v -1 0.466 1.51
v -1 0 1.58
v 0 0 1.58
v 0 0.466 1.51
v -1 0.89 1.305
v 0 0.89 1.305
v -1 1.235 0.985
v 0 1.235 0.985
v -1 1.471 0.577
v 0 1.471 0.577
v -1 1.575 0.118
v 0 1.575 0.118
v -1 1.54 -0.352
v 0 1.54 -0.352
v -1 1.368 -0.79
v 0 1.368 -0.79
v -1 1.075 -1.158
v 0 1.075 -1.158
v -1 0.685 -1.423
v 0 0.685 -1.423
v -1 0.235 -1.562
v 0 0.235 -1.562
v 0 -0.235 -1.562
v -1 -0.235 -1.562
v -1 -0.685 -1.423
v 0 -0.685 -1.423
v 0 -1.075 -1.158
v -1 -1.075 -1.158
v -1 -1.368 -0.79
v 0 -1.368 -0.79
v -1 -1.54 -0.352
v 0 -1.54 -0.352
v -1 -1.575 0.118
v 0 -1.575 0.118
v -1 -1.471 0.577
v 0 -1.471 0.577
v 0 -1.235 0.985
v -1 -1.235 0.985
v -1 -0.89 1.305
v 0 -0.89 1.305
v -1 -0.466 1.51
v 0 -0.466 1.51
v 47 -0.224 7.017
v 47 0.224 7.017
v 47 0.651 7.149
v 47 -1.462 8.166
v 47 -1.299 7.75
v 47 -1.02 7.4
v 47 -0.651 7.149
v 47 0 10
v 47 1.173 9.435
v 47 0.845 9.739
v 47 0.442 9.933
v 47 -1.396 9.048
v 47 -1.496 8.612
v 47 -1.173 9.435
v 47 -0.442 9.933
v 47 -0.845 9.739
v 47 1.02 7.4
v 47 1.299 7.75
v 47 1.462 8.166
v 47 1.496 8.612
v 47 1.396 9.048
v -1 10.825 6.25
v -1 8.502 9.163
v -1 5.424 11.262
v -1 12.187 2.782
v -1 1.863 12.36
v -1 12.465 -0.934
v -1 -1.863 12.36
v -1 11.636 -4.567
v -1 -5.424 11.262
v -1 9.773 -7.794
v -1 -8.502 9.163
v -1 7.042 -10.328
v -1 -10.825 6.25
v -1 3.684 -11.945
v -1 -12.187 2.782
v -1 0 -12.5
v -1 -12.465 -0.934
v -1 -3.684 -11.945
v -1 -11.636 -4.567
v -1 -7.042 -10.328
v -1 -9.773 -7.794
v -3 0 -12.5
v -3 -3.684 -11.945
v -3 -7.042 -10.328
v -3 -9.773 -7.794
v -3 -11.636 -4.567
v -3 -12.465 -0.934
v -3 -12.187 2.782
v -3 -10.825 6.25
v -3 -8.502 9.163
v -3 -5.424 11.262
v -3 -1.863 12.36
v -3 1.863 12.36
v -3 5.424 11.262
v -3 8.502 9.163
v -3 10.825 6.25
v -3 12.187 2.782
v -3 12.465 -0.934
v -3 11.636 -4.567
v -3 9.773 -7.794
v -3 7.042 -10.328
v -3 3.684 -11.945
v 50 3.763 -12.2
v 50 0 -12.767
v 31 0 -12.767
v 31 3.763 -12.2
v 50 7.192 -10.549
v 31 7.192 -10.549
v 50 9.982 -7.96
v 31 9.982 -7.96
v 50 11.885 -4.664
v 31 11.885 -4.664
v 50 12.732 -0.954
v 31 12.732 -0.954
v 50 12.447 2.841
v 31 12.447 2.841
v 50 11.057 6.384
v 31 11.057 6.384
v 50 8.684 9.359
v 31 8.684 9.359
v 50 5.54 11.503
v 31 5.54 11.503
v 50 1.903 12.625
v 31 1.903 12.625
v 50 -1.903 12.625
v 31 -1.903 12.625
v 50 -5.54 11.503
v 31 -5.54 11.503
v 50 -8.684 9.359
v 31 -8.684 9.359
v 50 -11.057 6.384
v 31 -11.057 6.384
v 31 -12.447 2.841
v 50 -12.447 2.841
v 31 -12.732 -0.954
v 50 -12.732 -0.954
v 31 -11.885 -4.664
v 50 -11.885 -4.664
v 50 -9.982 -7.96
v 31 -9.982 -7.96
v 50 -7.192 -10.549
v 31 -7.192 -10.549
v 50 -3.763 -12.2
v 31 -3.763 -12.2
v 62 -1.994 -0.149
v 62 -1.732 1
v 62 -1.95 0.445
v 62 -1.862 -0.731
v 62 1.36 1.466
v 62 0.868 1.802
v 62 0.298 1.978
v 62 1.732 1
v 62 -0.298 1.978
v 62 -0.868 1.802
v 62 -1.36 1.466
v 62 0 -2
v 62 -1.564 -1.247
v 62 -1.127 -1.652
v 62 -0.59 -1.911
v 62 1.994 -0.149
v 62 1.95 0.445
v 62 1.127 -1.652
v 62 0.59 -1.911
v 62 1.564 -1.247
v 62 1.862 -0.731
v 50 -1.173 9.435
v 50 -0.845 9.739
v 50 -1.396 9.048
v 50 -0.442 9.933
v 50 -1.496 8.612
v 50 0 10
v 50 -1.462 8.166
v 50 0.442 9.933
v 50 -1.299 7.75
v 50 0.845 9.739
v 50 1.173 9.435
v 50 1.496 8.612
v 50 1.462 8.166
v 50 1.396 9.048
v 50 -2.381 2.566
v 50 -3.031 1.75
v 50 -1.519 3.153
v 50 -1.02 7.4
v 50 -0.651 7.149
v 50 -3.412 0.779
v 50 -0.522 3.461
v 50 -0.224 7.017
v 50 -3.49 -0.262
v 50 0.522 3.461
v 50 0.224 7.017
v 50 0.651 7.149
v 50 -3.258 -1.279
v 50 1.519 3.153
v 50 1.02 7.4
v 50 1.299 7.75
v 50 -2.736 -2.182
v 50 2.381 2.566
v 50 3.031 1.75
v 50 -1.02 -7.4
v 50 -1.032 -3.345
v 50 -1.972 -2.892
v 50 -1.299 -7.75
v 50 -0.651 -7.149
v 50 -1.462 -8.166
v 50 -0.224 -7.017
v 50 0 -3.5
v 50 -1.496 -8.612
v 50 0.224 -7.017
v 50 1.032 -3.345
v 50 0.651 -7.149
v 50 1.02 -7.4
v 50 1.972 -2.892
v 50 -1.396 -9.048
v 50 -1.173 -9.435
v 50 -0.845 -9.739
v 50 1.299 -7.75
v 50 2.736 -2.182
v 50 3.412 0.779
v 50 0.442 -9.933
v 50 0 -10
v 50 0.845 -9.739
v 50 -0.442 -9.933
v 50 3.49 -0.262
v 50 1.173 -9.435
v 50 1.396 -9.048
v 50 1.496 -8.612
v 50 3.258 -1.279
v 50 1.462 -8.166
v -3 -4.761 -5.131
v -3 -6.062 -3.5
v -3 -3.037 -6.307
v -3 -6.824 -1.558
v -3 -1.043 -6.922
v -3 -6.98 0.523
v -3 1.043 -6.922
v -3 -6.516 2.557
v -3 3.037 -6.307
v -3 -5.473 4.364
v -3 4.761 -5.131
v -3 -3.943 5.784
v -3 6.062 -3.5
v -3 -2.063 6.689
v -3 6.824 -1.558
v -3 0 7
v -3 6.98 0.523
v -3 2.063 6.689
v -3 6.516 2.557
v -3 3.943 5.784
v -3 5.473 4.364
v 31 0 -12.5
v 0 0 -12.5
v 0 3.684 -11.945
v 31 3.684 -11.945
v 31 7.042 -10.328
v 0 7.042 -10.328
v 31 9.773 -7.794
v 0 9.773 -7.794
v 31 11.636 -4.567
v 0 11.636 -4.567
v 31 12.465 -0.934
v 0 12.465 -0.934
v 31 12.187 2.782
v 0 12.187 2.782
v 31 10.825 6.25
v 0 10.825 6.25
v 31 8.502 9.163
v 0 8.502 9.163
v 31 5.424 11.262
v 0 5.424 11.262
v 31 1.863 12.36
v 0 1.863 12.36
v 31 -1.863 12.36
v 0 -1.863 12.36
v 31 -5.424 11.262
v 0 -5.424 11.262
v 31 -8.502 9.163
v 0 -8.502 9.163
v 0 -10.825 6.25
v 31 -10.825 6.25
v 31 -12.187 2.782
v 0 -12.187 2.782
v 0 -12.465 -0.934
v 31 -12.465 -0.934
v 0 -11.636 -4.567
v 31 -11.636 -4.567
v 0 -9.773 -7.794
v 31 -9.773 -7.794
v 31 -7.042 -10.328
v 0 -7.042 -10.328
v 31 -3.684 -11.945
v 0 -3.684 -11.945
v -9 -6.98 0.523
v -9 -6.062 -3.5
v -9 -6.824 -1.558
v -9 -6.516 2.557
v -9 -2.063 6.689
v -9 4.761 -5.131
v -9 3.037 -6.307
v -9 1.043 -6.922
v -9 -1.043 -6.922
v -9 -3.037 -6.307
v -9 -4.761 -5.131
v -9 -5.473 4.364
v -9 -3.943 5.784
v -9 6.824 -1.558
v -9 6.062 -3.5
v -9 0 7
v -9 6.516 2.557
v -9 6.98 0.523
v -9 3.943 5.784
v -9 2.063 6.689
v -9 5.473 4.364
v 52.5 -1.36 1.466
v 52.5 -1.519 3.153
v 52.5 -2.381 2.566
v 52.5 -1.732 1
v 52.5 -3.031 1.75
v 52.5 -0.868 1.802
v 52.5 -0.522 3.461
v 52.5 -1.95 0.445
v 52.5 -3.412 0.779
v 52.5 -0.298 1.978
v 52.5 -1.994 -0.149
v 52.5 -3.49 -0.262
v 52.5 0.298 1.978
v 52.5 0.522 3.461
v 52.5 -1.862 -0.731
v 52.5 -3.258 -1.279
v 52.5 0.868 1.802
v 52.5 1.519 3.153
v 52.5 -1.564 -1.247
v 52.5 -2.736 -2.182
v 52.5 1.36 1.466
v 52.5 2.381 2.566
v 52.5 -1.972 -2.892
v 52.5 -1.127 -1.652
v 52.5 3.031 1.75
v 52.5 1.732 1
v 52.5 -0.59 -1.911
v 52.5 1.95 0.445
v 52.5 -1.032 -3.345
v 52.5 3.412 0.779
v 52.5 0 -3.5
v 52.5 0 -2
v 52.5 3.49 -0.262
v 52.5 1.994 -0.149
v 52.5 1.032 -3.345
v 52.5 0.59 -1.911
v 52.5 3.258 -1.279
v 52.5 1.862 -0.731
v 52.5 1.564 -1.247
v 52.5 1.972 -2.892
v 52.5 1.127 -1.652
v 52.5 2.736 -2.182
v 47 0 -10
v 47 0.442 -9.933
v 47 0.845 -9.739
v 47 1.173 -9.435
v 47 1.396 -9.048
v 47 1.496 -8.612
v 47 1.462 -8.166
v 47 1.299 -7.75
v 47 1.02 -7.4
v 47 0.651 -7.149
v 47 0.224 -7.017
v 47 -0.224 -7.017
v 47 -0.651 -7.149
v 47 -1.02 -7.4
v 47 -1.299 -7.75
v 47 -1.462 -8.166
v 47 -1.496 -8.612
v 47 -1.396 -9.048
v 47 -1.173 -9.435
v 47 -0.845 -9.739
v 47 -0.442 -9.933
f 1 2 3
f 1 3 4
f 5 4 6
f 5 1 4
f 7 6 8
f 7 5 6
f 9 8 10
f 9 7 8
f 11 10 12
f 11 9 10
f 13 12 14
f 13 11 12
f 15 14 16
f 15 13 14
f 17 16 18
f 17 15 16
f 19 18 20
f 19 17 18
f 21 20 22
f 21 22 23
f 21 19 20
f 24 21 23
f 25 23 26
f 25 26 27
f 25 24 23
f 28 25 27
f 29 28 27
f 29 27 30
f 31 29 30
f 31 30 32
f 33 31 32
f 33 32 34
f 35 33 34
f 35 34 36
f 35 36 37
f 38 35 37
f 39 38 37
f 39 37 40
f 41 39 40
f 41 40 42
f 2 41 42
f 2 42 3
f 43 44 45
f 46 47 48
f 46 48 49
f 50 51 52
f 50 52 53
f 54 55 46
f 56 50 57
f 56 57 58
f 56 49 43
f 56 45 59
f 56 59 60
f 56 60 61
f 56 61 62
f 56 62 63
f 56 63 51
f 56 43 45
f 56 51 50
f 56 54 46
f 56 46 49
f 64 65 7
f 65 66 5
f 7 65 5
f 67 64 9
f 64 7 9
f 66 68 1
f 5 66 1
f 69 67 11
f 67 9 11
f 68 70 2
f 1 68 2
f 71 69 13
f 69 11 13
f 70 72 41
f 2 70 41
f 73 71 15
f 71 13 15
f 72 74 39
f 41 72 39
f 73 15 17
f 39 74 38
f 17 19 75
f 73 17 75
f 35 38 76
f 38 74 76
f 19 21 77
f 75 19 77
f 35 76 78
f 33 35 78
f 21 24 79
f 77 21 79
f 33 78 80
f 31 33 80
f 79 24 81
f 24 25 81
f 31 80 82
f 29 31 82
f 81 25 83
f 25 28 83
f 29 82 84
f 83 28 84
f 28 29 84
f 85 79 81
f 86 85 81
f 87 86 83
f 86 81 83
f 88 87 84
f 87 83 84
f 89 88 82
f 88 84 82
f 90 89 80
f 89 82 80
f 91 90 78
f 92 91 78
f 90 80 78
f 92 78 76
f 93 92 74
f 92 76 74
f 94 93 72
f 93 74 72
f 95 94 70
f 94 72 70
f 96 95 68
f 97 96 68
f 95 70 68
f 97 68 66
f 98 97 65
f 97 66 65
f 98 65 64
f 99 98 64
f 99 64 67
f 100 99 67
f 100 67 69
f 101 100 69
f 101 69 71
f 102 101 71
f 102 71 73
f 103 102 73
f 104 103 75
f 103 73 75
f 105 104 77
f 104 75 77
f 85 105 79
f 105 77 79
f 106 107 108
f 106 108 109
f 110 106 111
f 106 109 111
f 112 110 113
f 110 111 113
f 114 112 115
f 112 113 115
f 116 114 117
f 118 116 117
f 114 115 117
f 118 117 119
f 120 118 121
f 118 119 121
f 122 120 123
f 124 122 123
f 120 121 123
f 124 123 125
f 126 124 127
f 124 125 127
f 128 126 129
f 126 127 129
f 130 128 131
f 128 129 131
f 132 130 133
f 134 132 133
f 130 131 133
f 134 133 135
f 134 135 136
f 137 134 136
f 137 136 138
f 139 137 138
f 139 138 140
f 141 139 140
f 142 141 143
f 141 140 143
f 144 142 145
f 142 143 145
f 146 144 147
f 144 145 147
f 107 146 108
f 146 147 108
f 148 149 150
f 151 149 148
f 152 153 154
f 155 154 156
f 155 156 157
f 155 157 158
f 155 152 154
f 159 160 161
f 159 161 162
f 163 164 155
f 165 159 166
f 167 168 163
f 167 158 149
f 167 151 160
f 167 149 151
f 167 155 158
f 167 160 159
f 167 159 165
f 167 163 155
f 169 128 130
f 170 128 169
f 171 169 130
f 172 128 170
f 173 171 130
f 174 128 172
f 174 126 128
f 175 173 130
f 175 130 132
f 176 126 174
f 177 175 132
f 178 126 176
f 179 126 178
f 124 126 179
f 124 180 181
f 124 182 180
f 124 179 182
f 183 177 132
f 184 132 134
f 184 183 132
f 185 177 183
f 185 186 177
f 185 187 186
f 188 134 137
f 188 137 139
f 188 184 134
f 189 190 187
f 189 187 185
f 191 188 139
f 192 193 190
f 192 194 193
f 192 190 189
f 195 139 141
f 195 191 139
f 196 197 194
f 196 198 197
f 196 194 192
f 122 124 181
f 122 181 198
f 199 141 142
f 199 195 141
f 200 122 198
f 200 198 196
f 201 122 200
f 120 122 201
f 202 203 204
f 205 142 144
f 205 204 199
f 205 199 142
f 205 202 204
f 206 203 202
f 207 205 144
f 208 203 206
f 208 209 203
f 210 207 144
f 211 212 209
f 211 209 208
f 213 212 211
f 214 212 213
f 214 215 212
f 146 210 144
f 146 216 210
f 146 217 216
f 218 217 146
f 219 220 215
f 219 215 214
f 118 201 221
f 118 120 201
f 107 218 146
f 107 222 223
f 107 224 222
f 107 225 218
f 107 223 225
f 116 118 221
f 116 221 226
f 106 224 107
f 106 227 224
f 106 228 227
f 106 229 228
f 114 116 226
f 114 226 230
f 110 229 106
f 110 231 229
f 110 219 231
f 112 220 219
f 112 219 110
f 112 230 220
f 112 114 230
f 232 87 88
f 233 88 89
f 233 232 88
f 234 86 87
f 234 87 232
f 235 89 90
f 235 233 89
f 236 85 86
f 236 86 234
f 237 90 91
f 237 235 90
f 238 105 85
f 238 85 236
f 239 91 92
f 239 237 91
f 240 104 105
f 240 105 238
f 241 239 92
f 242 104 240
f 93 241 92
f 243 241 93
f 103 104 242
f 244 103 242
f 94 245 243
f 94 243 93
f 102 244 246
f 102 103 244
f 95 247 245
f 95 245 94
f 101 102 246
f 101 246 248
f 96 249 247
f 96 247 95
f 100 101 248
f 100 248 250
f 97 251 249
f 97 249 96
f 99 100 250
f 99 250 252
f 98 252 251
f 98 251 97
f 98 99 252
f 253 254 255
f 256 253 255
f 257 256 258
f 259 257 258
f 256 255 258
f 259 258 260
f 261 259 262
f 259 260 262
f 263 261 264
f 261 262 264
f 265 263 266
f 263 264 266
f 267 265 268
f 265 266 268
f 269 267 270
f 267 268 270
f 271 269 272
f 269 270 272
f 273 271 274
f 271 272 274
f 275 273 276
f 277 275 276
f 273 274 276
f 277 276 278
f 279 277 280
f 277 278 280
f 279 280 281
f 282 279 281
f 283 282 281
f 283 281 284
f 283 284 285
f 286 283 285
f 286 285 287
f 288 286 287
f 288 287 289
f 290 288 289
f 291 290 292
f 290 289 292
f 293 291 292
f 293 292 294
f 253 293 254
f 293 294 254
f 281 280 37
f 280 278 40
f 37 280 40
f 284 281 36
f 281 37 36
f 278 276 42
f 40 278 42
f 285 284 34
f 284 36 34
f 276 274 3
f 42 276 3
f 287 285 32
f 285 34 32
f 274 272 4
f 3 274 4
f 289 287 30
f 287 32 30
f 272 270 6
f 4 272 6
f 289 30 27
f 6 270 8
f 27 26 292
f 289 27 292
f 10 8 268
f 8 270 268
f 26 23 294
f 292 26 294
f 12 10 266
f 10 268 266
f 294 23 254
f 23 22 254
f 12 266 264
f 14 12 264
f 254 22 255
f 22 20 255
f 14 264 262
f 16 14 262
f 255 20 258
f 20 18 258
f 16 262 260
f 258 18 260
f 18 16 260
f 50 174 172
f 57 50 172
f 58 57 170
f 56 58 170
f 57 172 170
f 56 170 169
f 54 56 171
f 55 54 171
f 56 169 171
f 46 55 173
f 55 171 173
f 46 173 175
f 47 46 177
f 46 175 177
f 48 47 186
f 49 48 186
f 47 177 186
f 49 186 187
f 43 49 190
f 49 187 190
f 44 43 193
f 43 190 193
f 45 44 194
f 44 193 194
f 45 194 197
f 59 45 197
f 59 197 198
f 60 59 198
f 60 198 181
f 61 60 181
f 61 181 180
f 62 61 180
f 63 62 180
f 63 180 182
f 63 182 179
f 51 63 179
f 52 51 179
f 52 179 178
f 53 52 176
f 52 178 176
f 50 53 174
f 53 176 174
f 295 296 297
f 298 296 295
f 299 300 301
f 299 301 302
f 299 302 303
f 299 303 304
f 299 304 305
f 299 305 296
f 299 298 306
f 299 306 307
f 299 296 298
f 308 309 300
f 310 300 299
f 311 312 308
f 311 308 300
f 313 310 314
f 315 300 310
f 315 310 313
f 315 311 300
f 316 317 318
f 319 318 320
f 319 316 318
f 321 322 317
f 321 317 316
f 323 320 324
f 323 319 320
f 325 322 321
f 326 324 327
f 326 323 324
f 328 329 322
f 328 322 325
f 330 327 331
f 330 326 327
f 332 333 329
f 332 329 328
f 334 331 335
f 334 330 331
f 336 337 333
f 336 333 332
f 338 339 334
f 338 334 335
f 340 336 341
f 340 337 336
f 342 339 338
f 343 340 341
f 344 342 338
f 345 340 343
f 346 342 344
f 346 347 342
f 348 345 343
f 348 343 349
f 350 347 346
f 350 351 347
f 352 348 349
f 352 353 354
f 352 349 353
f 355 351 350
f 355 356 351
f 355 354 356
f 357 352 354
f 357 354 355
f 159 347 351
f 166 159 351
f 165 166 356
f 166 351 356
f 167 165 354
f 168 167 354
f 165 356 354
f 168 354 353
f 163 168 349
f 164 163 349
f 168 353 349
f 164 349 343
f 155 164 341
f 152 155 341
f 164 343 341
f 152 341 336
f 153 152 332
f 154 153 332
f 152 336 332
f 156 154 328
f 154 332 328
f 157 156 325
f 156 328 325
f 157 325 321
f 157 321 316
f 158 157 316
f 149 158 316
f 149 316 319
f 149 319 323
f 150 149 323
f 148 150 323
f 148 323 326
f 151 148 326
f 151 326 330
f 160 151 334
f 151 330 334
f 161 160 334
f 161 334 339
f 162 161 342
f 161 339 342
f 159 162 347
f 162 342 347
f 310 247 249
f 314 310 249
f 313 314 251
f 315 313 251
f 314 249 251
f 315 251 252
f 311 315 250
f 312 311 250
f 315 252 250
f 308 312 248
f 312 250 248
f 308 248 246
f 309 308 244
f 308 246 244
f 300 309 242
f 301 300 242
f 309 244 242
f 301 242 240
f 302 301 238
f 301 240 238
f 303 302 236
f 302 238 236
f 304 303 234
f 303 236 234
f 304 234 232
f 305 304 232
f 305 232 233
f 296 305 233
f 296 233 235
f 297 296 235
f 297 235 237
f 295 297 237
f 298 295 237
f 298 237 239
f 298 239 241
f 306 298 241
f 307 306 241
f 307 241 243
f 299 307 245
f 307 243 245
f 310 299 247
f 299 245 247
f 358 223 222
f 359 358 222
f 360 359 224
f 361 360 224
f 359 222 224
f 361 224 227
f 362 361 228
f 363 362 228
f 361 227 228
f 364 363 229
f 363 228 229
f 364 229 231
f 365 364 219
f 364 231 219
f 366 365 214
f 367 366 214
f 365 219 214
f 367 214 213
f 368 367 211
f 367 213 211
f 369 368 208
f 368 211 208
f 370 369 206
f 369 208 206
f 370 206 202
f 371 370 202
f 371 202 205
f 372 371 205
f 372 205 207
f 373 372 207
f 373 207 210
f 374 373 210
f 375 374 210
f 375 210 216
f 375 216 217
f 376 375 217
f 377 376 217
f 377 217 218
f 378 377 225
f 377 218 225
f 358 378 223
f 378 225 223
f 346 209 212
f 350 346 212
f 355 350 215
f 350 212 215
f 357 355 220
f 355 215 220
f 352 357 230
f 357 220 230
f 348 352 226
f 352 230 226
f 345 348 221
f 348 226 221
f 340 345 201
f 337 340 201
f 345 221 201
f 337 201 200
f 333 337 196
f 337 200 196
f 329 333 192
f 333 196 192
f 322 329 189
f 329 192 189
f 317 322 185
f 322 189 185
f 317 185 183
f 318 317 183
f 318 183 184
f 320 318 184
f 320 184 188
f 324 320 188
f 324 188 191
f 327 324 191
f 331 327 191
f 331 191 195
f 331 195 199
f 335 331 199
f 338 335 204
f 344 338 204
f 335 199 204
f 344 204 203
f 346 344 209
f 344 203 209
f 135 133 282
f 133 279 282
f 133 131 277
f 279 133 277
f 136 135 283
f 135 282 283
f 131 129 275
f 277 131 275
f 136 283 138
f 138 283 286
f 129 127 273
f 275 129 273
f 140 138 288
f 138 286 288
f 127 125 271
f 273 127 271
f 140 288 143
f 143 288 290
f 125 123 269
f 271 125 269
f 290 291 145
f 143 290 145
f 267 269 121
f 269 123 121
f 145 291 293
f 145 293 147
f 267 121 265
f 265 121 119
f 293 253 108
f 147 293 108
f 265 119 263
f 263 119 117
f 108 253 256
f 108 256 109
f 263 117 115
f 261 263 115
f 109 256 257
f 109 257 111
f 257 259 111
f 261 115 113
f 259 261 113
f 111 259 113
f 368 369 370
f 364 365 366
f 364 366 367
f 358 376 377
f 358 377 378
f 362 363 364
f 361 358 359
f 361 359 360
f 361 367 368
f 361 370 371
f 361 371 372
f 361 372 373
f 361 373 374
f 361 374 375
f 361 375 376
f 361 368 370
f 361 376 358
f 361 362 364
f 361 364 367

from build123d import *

# Parameters (mm, degrees)
SKETCH_1_R          = 12.5
EXTRUDE_1_DEPTH     = 31
SKETCH_2_R          = 12.76725859
EXTRUDE_2_DEPTH     = 19
SKETCH_3_R          = 3.5
EXTRUDE_3_DEPTH     = 2.5
SKETCH_4_R          = 2
EXTRUDE_4_DEPTH     = 9.5
EXTRUDE_START       = 1
SKETCH_5_R          = 12.5
EXTRUDE_5_DEPTH     = 2
SKETCH_6_R          = 1.579870025
EXTRUDE_6_DEPTH     = 4
SKETCH_7_R          = 7
EXTRUDE_7_DEPTH     = 6
SKETCH_8_R          = 1.5
CUT_EXTRUDE_1_DEPTH = 3


with BuildPart() as part:
    # 草图1 → 凸台-拉伸1 (new body)
    with BuildSketch(Plane(origin=(0, 0, 0), x_dir=(0, 0, -1), z_dir=(1, 0, 0))):
        Circle(SKETCH_1_R)
    extrude(amount=EXTRUDE_1_DEPTH)

    # 草图2 → 凸台-拉伸2 (add)
    with BuildSketch(Plane(origin=(31, 0, 0), x_dir=(0, 0, -1), z_dir=(1, 0, 0))):
        Circle(SKETCH_2_R)
    extrude(amount=EXTRUDE_2_DEPTH)

    # 草图3 → 凸台-拉伸3 (add)
    with BuildSketch(Plane(origin=(50, 0, 0), x_dir=(0, 0, -1), z_dir=(1, 0, 0))):
        Circle(SKETCH_3_R)
    extrude(amount=EXTRUDE_3_DEPTH)

    # 草图4 → 凸台-拉伸4 (add)
    with BuildSketch(Plane(origin=(52.5, 0, 0), x_dir=(0, 0, -1), z_dir=(1, 0, 0))):
        Circle(SKETCH_4_R)
    extrude(amount=EXTRUDE_4_DEPTH)



with BuildPart() as body_2:
    # 草图5 → 凸台-拉伸5 (new body)
    with BuildSketch(Plane.ZY.offset(EXTRUDE_START)):
        with Locations(Location((0, 0, 0), (0, 0, 180))):
            Circle(SKETCH_5_R)
    extrude(amount=EXTRUDE_5_DEPTH)


with BuildPart() as part_1:
    add(part.part)

    add(body_2.part)  # 凸台-拉伸6 merges body 2
    # 草图6 → 凸台-拉伸6 (add)
    with BuildSketch(Plane.ZY.offset(3)):
        Circle(SKETCH_6_R)
    extrude(amount=-EXTRUDE_6_DEPTH)

    # 草图7 → 凸台-拉伸7 (add)
    with BuildSketch(Plane.ZY.offset(3)):
        Circle(SKETCH_7_R)
    extrude(amount=EXTRUDE_7_DEPTH)

    # 草图8 → 切除-拉伸1 (cut)
    with BuildSketch(Plane(origin=(50, 0, 0), x_dir=(0, 0, -1), z_dir=(1, 0, 0))):
        with Locations((8.5, 0)):
            Circle(SKETCH_8_R)
        with Locations(Location((-8.5, 0, 0), (0, 0, 180))):
            Circle(SKETCH_8_R)
    extrude(amount=-CUT_EXTRUDE_1_DEPTH, mode=Mode.SUBTRACT)


solid = part_1.part
